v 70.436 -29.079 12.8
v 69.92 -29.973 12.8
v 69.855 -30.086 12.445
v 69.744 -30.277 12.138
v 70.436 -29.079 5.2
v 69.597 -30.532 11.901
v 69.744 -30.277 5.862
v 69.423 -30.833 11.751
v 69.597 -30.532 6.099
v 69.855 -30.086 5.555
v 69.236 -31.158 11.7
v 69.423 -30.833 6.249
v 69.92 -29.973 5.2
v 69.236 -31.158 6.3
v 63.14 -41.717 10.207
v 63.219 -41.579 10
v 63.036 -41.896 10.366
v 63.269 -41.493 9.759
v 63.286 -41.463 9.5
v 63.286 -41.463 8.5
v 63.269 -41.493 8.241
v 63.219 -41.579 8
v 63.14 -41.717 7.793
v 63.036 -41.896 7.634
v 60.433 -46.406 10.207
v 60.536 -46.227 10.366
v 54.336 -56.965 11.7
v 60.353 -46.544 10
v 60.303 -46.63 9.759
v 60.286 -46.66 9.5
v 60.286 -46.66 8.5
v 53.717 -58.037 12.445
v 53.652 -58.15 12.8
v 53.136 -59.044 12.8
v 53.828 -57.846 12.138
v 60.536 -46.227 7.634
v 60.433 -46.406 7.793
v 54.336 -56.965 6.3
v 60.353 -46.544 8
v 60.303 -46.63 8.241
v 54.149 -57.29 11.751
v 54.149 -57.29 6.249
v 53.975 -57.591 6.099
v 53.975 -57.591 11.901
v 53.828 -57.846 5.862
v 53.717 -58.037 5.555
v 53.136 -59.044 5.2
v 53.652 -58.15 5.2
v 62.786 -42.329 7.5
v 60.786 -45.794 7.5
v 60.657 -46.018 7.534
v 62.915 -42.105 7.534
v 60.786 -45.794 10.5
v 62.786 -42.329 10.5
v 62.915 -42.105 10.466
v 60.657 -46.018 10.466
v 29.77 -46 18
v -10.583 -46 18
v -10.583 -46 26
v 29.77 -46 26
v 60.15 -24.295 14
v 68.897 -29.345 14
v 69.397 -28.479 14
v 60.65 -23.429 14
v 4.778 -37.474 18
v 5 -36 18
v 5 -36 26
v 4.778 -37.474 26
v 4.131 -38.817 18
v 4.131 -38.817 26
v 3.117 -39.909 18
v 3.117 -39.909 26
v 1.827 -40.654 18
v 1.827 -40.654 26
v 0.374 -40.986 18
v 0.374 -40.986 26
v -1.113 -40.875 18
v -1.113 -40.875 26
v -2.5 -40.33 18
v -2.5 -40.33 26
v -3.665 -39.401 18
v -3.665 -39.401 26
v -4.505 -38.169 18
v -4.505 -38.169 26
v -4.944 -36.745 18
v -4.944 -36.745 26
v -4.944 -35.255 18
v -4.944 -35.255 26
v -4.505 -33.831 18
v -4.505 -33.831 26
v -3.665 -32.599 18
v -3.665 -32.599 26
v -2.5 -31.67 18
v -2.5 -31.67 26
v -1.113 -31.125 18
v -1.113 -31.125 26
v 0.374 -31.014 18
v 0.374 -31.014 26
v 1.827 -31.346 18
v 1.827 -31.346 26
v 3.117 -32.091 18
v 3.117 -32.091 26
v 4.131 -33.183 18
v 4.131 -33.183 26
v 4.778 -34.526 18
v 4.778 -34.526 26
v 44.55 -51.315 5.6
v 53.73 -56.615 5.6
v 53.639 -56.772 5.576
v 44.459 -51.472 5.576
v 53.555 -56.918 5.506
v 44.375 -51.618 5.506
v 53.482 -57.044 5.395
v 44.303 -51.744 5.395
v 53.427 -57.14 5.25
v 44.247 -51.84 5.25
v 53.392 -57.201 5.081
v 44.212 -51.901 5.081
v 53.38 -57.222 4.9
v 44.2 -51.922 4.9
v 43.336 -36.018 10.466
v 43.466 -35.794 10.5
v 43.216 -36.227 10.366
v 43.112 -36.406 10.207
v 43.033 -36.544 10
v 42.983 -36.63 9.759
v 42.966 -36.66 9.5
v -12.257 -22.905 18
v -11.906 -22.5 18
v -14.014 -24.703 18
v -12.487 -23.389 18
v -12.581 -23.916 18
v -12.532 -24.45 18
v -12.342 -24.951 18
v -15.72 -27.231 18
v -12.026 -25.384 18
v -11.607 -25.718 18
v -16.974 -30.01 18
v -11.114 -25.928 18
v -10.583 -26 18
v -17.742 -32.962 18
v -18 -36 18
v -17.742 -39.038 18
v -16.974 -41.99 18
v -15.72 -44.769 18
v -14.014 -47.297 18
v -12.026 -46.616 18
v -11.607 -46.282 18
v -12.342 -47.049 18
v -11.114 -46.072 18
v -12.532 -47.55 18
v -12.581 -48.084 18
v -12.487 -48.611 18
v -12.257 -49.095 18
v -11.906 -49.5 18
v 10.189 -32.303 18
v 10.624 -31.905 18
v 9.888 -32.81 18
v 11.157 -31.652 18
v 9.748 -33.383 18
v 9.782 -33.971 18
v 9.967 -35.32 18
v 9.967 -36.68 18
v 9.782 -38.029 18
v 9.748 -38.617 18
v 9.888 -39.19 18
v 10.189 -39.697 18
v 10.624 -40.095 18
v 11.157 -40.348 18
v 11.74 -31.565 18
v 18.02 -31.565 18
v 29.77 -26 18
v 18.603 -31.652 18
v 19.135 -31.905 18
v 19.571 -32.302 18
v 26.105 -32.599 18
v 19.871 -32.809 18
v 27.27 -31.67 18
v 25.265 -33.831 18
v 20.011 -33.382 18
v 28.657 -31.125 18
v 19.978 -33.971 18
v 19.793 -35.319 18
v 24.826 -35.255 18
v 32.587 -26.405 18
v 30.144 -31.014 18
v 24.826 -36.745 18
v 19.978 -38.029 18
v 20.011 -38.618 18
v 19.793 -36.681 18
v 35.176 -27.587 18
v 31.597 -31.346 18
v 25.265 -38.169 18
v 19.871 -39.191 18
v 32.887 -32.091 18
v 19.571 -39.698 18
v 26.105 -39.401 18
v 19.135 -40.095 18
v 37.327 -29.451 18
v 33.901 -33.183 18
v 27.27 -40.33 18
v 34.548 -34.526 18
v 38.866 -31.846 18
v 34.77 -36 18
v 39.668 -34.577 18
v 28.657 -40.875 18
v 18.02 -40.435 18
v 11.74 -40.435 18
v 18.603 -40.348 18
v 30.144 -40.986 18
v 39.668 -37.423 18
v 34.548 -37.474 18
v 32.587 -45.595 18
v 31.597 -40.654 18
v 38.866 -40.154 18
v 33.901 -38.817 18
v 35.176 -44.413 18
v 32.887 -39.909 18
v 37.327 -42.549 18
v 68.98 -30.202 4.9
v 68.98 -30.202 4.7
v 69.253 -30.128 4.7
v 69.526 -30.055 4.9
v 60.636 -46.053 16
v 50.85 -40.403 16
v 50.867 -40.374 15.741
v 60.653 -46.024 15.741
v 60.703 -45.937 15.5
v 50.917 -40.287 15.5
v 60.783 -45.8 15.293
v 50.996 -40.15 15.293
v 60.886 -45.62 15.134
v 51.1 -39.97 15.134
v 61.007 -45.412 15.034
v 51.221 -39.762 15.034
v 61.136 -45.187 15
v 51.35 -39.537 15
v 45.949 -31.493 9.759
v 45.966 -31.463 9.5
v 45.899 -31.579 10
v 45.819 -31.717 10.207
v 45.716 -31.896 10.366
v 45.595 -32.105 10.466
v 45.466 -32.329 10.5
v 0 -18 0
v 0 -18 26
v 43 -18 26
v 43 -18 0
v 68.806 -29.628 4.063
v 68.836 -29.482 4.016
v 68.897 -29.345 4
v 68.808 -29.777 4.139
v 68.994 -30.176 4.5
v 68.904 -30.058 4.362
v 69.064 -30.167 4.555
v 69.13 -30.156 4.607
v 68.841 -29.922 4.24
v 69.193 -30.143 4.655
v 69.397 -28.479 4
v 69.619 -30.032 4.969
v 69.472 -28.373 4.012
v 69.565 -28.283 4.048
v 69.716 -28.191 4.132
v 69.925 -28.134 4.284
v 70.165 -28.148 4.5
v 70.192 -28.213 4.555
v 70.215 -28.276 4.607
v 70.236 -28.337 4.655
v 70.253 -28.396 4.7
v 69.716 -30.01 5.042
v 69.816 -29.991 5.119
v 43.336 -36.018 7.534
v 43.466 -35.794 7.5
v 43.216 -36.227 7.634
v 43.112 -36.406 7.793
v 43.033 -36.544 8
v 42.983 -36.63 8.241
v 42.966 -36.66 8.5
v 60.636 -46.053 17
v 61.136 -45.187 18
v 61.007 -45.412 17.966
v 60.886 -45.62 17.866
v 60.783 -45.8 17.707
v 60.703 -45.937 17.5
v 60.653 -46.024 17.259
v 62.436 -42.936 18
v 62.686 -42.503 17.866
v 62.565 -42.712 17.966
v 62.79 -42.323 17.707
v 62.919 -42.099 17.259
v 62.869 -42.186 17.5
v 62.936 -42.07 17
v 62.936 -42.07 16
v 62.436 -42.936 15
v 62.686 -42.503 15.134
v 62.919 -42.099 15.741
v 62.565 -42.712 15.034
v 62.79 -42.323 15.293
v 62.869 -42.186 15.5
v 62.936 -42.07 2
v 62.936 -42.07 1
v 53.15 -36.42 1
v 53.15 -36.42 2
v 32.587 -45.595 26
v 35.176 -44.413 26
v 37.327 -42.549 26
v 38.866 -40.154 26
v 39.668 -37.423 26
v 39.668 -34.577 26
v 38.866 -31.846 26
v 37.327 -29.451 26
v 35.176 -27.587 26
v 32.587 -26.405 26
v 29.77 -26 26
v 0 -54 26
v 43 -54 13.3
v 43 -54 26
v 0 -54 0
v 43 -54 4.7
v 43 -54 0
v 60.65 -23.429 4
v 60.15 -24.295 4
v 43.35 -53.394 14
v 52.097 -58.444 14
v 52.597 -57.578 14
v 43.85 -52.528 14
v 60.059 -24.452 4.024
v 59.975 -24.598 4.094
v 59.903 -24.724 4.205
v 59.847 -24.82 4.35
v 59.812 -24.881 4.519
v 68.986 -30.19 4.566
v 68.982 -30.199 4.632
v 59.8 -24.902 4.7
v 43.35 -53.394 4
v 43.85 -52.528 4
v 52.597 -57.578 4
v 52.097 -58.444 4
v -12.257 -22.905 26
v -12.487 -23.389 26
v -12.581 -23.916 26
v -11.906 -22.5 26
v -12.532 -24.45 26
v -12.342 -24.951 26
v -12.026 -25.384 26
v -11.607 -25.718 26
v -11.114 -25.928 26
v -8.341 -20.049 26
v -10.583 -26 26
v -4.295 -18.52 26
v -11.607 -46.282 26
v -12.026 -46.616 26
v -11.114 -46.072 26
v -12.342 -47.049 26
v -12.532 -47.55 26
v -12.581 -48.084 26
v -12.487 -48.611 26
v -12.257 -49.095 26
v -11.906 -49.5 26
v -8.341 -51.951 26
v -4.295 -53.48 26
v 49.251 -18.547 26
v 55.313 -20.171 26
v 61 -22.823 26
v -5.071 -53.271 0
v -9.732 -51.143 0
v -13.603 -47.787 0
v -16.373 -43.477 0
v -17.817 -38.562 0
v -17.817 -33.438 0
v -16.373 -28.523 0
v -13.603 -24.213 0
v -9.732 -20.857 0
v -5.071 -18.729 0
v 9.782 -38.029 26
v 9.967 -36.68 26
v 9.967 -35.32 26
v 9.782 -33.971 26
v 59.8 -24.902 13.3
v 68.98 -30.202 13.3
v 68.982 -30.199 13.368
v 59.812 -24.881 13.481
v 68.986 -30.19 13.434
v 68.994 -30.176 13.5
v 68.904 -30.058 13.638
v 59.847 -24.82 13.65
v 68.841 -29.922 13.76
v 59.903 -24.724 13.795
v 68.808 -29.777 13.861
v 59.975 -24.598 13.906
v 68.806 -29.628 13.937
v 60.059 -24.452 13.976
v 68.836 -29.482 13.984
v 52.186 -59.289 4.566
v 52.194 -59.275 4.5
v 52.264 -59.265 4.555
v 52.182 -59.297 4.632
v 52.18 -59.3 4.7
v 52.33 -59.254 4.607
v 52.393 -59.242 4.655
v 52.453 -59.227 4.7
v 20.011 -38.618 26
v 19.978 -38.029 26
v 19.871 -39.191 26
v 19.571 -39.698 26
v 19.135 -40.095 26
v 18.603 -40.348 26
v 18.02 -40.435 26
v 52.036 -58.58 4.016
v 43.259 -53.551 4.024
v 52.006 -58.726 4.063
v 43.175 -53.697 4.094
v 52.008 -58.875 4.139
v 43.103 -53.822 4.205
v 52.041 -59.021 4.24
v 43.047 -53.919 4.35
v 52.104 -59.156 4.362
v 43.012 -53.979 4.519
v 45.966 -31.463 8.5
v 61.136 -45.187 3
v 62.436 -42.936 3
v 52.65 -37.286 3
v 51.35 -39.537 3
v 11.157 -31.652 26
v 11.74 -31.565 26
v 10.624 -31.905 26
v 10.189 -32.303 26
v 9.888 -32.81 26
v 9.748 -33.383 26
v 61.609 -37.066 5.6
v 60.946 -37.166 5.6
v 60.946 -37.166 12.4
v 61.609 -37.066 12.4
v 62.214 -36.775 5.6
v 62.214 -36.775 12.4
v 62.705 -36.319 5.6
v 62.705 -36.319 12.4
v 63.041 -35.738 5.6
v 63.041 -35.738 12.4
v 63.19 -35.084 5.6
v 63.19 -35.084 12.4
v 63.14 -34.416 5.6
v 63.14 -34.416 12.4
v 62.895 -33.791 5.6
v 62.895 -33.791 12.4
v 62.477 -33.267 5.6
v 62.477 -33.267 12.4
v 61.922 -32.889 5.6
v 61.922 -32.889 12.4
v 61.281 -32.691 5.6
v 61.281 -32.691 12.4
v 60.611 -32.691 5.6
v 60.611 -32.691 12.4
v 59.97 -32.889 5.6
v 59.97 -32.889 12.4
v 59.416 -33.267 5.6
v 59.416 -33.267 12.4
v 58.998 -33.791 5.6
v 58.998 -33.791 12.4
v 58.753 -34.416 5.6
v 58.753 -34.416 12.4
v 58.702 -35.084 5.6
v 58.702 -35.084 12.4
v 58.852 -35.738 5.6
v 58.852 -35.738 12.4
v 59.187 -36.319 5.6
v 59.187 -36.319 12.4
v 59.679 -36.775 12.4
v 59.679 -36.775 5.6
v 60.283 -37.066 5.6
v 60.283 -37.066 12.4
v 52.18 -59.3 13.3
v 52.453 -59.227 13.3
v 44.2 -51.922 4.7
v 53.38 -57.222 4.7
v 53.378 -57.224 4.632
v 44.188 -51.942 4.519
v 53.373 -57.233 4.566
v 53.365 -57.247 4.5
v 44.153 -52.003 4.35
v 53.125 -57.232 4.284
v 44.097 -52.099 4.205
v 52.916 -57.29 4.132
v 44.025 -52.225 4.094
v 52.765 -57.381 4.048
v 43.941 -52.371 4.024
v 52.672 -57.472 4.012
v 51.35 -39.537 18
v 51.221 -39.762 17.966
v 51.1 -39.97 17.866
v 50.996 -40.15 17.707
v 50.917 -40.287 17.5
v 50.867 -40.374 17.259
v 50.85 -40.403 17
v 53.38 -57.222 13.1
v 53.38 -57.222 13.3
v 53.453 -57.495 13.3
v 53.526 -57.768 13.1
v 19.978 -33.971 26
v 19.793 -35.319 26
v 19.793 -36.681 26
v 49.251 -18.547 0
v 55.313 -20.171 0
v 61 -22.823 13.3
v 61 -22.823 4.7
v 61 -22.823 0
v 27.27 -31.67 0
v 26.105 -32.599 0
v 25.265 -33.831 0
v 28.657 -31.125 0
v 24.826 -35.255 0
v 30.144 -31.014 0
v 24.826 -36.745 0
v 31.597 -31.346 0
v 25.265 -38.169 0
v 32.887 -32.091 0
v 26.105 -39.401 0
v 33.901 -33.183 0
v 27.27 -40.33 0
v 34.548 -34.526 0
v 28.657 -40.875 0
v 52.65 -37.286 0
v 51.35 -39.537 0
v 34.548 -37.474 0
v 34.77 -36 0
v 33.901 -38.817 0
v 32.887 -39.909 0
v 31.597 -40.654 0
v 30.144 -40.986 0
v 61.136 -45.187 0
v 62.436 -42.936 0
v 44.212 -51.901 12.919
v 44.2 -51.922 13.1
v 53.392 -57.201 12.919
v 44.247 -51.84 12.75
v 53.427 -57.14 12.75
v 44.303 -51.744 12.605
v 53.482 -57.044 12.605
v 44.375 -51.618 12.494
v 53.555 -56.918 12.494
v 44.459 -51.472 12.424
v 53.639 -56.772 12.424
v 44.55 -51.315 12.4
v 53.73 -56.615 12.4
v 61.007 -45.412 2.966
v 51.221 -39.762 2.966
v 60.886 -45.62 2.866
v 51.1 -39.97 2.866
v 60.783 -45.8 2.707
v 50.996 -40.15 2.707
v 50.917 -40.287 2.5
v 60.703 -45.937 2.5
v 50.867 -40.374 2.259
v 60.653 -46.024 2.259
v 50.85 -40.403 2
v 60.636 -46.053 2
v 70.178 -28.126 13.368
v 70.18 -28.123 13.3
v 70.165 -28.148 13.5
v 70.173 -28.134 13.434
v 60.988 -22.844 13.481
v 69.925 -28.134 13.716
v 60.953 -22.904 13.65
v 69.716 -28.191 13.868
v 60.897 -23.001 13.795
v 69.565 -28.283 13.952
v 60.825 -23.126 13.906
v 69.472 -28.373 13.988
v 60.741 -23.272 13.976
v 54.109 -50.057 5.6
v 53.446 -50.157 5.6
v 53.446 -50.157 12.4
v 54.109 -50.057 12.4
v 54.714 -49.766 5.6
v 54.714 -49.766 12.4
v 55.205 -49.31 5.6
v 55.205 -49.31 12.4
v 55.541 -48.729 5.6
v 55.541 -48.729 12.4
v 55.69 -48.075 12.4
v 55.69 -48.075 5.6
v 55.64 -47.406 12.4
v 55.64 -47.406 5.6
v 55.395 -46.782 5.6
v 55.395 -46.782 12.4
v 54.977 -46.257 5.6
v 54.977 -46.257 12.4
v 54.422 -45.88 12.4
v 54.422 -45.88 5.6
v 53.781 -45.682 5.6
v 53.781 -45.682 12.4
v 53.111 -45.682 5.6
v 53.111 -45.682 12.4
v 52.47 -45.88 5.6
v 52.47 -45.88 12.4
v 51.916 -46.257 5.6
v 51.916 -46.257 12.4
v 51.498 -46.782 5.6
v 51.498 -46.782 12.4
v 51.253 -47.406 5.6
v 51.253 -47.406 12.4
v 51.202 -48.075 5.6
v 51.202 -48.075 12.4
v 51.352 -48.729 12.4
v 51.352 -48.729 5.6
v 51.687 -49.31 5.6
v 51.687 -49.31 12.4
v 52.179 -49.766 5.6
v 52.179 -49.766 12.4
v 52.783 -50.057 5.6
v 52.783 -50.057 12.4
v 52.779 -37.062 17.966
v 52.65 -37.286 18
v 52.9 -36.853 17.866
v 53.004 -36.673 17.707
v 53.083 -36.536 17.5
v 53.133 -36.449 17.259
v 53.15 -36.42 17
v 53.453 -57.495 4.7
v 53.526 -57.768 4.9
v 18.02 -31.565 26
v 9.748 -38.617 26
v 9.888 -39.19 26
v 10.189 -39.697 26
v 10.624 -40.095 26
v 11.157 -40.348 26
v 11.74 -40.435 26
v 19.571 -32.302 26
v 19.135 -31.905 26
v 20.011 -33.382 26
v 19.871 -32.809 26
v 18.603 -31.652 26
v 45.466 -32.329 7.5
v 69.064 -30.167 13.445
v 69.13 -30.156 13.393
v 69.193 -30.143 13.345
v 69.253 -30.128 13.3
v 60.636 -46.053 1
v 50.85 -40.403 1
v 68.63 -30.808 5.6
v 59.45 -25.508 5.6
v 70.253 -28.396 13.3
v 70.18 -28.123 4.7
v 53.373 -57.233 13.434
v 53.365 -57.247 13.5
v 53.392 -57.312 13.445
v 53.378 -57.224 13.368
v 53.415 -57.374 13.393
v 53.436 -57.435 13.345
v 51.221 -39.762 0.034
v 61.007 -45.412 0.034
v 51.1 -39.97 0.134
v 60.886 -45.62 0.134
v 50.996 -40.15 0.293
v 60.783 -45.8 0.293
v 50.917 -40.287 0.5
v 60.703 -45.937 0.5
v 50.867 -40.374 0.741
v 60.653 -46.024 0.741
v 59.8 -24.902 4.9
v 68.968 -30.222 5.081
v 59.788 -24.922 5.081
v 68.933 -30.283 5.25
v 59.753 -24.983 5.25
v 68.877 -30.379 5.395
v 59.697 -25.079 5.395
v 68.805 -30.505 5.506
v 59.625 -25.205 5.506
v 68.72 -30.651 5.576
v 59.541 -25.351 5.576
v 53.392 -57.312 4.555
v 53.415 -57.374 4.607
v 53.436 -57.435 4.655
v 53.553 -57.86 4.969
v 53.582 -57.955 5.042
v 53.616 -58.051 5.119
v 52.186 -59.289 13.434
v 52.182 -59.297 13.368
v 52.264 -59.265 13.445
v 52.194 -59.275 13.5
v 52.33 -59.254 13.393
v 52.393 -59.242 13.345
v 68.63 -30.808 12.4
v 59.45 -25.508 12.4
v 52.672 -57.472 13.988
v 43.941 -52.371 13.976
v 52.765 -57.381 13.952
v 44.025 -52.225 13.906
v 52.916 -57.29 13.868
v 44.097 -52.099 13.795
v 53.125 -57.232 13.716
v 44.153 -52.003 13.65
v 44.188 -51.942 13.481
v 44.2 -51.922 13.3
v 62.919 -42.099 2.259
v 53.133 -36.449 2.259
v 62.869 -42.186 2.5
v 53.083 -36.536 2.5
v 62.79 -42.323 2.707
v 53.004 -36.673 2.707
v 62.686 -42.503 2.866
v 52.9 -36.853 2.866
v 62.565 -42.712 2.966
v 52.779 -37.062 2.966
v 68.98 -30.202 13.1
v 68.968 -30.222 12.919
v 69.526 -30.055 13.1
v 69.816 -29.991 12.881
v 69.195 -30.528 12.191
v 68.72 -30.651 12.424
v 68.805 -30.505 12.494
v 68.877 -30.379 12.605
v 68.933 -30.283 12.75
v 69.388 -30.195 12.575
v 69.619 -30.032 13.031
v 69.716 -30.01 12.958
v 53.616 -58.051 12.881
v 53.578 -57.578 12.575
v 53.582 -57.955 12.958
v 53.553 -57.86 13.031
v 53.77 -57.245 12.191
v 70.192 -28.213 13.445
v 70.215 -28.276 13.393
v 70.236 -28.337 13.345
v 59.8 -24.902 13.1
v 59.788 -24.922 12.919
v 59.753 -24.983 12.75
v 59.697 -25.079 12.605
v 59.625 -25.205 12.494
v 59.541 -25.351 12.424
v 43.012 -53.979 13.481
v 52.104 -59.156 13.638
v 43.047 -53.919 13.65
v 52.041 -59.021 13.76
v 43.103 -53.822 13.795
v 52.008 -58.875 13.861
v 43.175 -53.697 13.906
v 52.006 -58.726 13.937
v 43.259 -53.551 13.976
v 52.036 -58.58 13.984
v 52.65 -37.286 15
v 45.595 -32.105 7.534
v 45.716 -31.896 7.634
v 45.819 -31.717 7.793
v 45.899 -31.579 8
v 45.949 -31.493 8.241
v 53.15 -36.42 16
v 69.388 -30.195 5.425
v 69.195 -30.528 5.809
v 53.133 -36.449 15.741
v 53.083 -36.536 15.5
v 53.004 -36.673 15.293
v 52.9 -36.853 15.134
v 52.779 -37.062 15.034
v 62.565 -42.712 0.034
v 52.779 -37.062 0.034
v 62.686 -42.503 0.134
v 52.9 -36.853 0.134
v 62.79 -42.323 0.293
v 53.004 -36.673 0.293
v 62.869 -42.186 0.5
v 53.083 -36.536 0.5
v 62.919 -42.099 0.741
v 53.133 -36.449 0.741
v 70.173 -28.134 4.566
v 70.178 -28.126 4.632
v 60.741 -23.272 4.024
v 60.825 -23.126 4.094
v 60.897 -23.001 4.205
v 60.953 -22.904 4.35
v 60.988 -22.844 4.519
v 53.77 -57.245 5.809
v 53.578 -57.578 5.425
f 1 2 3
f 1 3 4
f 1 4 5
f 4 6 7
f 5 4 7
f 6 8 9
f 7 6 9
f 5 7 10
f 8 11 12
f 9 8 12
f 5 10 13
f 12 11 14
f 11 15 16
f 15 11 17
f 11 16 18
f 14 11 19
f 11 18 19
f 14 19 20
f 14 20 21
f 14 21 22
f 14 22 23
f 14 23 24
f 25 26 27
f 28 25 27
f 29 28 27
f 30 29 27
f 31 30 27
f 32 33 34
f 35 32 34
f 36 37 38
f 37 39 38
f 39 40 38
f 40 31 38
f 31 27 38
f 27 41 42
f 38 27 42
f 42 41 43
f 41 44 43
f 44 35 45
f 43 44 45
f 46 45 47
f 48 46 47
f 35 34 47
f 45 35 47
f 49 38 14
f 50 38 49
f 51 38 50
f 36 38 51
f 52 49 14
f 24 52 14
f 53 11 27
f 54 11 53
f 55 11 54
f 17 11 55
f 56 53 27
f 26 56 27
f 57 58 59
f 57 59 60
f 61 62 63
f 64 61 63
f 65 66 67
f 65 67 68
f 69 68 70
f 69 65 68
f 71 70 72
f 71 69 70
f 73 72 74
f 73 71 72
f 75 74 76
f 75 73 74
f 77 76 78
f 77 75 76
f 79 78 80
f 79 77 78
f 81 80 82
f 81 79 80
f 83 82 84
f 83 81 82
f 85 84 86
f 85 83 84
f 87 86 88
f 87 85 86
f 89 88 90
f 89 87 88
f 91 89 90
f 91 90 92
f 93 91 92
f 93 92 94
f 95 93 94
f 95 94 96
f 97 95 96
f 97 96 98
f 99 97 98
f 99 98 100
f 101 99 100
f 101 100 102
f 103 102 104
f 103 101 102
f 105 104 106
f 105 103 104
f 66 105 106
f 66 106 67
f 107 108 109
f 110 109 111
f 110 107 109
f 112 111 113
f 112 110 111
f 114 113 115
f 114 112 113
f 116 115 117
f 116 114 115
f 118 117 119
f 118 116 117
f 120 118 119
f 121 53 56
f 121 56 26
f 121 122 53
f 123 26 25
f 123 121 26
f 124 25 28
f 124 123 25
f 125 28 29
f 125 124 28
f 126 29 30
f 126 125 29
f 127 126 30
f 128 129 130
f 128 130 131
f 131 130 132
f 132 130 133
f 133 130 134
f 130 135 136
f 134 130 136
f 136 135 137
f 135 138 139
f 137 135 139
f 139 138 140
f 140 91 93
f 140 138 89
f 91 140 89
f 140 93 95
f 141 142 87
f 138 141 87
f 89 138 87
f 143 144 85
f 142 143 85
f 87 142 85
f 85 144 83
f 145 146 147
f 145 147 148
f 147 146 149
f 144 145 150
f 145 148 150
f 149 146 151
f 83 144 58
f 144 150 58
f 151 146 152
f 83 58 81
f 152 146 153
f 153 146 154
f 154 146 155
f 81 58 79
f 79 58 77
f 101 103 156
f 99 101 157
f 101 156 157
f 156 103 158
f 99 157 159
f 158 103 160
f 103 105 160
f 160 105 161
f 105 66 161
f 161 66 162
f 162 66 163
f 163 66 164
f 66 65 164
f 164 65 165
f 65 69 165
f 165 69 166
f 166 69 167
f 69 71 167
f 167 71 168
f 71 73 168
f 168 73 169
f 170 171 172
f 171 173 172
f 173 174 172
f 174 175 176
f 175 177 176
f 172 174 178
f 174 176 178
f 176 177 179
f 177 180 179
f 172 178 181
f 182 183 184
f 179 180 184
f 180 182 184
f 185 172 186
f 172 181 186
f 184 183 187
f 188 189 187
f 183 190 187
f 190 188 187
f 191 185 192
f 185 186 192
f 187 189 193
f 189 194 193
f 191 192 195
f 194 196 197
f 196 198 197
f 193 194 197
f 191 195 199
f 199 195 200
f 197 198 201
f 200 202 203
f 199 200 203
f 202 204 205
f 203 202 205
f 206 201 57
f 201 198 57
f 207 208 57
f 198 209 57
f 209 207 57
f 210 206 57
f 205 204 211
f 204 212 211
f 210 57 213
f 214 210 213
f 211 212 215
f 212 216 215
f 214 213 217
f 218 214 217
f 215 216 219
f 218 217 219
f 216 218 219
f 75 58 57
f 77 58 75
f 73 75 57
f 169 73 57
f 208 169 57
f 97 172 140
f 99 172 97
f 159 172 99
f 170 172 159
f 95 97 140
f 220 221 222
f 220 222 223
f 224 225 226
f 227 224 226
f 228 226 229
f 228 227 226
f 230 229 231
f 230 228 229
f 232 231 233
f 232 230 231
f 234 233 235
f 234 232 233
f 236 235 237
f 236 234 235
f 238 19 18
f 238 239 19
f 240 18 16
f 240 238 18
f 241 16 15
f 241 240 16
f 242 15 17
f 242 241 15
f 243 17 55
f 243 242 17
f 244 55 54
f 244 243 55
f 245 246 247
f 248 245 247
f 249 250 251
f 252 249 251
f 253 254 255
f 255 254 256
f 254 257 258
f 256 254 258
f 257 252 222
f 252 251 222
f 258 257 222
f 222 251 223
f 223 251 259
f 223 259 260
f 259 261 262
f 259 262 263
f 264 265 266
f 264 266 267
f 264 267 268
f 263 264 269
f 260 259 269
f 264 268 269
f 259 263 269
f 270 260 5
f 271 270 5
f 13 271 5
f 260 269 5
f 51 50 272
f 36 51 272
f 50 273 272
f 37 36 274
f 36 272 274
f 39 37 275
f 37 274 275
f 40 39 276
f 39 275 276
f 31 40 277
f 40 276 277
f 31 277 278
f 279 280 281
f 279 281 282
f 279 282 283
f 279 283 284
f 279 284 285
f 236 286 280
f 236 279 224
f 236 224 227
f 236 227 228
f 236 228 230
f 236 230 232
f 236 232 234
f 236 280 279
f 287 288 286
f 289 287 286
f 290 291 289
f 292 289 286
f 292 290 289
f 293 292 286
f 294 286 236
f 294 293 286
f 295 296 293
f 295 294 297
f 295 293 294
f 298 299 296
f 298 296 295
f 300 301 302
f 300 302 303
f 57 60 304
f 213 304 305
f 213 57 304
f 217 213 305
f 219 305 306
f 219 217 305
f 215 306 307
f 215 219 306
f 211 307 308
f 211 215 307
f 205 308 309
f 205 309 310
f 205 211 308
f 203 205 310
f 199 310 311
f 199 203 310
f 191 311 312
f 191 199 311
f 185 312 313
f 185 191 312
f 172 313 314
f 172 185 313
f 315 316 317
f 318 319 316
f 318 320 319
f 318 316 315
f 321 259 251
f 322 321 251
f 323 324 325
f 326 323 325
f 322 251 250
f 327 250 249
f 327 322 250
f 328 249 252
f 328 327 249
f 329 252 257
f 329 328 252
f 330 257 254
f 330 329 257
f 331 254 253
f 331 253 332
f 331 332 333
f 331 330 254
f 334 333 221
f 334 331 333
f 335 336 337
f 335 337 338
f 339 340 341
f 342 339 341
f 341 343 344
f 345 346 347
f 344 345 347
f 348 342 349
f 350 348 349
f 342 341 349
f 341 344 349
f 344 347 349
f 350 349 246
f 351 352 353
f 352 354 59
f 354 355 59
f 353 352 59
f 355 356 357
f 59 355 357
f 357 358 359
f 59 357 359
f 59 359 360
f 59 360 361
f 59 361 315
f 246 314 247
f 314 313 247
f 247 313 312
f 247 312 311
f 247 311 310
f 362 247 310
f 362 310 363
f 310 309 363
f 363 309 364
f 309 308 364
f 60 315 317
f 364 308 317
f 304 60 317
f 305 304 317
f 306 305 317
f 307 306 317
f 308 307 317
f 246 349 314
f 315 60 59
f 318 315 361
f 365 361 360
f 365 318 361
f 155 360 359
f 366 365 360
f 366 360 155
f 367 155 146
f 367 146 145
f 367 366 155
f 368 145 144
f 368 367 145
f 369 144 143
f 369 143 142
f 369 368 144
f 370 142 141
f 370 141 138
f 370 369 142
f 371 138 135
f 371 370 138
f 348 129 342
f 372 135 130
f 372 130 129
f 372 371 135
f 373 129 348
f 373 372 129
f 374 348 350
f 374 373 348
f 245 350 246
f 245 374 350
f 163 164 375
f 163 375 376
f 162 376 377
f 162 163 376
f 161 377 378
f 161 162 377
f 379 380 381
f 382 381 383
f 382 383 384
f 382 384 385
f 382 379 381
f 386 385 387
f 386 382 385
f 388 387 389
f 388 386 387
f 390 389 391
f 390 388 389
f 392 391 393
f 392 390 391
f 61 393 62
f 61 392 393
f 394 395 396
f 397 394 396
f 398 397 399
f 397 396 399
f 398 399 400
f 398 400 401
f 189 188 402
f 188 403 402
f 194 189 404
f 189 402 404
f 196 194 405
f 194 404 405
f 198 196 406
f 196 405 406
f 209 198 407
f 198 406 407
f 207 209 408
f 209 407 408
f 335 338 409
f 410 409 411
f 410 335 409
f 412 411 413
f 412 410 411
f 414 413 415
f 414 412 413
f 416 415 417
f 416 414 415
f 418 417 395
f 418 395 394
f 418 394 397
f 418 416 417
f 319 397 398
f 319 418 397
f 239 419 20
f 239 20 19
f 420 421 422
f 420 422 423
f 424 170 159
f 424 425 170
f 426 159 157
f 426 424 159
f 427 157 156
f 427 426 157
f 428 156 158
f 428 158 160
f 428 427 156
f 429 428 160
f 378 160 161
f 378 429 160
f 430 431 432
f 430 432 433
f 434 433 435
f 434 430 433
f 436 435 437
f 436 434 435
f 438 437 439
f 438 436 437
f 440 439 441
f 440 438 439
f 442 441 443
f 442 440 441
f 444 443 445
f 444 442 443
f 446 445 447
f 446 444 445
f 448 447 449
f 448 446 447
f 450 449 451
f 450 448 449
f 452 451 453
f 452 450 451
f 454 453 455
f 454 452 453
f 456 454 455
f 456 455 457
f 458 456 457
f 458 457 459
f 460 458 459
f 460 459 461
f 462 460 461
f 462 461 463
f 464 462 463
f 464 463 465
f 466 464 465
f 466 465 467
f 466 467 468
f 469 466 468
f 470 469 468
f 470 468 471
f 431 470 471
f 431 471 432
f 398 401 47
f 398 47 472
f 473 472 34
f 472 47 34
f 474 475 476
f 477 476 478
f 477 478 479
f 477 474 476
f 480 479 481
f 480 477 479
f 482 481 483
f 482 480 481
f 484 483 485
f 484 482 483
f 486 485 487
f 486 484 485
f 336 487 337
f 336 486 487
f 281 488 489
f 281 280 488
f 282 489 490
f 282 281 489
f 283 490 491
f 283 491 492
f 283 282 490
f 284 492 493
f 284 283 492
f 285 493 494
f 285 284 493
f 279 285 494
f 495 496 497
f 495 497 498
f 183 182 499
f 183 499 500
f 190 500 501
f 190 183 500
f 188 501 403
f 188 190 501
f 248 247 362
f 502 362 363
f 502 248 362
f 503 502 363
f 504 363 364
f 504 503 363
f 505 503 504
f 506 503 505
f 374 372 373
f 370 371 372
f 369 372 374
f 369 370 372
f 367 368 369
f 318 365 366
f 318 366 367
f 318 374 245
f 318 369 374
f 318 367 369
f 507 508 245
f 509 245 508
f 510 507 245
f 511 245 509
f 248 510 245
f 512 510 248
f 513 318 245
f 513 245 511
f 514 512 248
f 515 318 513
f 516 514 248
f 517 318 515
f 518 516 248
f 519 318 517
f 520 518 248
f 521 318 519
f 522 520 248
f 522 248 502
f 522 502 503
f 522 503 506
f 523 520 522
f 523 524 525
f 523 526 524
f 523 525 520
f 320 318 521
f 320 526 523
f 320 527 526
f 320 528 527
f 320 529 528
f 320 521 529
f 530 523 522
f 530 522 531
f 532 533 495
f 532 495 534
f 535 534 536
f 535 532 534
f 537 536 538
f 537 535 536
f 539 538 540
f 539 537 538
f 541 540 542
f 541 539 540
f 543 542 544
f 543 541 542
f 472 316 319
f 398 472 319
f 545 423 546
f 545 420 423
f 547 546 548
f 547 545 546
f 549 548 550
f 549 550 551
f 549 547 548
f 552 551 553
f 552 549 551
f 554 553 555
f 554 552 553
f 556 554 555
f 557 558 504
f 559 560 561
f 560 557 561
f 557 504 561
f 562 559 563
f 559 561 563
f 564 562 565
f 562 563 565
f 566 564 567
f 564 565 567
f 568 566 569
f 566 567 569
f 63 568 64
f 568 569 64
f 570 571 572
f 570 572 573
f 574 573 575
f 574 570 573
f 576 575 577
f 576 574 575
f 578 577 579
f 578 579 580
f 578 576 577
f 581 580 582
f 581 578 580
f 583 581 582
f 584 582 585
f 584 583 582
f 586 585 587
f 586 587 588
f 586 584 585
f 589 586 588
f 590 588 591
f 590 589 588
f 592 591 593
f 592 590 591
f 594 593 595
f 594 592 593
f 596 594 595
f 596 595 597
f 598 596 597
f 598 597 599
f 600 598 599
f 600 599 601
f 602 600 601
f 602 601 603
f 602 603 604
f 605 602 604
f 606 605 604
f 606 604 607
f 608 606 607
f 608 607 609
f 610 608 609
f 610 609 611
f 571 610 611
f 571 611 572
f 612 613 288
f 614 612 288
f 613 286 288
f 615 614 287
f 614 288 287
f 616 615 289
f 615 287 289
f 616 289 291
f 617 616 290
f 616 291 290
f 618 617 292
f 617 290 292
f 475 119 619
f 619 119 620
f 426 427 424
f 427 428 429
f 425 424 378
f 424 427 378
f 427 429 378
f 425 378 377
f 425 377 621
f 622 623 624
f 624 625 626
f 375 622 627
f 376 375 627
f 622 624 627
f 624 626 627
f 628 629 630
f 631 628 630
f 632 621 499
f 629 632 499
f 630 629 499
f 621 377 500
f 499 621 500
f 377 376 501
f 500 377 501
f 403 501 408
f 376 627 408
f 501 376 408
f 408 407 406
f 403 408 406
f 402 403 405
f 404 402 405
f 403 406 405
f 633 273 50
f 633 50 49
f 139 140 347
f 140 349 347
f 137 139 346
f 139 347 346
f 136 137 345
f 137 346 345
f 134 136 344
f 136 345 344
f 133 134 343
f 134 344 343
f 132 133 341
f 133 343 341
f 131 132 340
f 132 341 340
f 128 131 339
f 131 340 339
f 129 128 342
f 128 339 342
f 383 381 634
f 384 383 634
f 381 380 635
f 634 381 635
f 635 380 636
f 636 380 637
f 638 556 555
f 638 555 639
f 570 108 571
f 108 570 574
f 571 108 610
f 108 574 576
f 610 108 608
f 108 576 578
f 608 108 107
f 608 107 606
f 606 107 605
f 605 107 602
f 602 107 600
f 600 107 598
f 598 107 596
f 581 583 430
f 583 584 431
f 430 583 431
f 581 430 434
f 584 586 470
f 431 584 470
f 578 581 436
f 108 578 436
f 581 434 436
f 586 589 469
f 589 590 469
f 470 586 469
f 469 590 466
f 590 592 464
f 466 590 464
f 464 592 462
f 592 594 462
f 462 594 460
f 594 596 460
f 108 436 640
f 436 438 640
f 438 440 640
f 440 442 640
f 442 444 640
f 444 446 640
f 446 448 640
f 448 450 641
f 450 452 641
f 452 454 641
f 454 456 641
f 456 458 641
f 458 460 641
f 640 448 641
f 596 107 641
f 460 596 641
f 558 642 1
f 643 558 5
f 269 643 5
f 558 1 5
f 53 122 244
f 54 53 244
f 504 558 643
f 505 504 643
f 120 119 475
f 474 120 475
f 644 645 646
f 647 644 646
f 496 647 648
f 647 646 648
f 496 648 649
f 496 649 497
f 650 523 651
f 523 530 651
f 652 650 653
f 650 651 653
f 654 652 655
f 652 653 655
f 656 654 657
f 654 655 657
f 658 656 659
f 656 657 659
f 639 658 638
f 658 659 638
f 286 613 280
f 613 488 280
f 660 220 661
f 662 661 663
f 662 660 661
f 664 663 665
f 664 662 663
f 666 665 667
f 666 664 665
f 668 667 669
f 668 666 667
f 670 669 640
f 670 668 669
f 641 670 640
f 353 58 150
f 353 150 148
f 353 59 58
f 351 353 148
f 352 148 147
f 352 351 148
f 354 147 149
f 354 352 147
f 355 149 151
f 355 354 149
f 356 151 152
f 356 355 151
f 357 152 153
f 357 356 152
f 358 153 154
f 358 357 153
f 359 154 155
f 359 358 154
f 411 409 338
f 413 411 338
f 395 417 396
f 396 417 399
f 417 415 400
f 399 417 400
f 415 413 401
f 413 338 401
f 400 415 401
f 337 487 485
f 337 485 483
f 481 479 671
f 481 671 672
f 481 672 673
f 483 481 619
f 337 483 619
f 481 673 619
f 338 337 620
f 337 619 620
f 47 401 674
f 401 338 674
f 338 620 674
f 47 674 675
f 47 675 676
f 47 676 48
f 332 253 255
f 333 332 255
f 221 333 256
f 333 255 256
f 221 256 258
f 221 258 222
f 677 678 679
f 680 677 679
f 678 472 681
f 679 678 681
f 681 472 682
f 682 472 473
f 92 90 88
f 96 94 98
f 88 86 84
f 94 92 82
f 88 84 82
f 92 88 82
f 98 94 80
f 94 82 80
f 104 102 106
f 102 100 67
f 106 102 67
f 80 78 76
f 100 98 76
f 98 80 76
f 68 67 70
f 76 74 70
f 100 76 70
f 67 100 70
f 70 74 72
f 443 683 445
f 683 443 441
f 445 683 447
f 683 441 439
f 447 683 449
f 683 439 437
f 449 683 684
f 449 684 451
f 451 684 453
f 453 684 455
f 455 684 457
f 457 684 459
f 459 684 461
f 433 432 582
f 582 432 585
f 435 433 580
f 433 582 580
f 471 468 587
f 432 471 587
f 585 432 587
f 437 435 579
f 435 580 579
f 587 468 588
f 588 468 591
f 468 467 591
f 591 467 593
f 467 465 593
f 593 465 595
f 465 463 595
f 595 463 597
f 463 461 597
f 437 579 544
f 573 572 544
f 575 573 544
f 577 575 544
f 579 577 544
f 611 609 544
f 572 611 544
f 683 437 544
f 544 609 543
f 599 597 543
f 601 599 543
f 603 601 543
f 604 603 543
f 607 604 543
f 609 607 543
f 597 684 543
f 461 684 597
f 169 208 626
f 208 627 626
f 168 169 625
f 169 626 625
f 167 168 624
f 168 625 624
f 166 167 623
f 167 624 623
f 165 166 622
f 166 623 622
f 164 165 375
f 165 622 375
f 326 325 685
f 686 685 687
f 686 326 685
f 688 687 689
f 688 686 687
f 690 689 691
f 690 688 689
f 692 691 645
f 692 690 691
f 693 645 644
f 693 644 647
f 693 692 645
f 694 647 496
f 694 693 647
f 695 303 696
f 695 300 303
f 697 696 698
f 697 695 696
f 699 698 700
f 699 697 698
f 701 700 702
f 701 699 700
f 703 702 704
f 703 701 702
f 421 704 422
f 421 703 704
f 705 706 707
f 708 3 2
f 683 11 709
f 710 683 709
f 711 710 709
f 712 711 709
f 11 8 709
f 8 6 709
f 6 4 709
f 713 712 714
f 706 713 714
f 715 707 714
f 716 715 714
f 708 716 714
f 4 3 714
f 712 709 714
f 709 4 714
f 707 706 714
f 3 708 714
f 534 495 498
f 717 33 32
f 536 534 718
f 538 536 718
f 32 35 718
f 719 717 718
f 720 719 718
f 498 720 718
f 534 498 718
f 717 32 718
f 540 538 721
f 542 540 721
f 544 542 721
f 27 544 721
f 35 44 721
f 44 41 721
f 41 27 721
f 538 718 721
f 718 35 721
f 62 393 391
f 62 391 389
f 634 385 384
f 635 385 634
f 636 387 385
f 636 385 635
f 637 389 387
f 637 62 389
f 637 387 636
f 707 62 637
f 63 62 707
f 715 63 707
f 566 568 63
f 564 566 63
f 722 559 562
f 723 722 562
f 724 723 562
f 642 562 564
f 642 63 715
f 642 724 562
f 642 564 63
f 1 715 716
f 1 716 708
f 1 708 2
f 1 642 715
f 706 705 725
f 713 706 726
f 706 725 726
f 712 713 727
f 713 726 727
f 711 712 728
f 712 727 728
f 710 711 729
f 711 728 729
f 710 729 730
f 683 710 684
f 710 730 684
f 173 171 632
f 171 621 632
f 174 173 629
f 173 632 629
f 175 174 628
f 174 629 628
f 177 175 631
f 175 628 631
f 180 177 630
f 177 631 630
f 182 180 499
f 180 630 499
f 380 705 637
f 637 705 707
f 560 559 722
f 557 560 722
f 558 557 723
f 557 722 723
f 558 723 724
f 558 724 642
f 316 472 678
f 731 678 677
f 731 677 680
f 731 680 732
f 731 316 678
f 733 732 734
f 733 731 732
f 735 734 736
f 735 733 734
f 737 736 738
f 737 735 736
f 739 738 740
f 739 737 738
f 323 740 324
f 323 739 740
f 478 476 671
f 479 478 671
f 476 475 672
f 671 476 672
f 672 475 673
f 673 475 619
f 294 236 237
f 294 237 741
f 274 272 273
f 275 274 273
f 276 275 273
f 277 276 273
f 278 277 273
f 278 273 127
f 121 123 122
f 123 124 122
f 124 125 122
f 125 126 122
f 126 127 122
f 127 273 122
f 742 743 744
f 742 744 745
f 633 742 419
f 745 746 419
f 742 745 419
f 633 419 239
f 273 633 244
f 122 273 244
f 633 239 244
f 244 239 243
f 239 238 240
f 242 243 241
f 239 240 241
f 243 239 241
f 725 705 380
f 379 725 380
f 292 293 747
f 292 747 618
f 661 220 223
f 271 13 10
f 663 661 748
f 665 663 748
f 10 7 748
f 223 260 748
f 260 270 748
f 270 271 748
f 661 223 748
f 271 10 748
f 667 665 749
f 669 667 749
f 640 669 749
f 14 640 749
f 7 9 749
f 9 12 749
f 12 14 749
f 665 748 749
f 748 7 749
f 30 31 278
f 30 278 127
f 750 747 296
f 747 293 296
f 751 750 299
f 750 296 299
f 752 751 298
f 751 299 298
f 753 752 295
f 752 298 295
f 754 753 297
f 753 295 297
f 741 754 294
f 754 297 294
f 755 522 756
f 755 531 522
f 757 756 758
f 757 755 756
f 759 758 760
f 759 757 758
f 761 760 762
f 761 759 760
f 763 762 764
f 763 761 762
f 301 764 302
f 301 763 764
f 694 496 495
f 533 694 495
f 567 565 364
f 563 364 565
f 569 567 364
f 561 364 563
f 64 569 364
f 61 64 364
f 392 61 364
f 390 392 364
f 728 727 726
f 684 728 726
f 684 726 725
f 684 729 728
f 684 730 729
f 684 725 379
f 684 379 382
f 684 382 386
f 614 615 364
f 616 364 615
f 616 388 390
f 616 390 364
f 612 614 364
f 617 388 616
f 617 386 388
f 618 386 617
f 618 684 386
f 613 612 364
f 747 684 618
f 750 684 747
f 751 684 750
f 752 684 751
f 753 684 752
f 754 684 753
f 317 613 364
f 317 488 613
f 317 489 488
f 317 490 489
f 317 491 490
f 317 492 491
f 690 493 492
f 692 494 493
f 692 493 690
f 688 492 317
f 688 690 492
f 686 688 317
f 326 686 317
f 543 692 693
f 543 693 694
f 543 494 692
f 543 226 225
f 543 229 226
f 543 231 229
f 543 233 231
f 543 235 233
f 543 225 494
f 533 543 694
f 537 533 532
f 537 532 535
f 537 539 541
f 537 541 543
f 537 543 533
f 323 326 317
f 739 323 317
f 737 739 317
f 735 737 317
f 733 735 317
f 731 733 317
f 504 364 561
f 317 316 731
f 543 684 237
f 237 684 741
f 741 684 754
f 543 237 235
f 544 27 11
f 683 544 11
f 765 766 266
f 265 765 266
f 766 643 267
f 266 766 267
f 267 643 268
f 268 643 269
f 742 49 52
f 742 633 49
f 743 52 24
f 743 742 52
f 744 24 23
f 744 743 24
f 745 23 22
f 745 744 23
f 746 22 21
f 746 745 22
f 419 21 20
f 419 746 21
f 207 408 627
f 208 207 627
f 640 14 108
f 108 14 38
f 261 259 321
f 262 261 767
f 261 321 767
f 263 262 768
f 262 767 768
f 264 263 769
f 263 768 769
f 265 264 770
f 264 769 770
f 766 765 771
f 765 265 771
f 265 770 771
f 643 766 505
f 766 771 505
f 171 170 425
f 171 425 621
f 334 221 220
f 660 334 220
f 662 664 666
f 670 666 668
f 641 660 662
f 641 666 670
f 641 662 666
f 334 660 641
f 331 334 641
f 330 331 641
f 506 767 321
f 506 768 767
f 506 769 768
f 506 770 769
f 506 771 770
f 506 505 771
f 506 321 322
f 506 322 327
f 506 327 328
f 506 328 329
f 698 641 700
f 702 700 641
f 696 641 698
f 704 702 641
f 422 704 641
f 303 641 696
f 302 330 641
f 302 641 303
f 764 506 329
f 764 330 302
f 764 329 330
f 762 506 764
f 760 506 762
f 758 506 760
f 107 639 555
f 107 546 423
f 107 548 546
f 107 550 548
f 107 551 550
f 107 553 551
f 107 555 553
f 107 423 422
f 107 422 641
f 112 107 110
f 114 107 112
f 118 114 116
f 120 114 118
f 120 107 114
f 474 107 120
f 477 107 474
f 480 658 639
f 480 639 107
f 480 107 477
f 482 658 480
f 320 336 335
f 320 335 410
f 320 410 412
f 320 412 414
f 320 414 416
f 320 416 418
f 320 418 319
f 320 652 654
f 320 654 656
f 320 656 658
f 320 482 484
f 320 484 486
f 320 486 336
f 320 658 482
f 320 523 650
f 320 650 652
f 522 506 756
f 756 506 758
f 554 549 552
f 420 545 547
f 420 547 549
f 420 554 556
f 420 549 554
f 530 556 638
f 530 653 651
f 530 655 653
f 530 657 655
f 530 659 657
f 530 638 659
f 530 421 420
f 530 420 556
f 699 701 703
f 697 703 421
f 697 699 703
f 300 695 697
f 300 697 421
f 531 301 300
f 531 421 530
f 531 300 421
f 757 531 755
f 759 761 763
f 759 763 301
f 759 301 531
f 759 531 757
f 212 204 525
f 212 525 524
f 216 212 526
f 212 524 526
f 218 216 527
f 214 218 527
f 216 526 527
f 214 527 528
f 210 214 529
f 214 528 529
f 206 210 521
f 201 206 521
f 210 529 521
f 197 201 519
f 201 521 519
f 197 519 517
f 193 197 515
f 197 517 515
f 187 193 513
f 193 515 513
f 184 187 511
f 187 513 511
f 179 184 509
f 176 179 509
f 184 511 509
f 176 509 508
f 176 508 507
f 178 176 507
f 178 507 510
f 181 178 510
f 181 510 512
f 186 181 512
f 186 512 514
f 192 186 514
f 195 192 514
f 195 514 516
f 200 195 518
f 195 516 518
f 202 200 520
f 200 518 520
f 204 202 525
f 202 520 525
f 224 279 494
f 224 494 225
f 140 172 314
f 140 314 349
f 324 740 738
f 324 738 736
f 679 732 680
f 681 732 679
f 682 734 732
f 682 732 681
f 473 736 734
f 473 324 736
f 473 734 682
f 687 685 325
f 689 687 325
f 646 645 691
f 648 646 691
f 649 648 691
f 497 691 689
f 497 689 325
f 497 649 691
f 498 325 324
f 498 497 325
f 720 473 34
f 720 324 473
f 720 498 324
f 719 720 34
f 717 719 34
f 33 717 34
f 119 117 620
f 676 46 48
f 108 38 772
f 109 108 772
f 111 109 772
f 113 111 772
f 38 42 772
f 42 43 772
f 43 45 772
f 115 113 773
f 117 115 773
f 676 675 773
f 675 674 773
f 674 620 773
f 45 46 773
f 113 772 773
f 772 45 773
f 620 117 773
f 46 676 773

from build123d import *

# Parameters (mm, degrees)
SKETCH_1_R          = 4.9999999999999964
EXTRUDE_1_DEPTH     = 18
SKETCH_2_R          = 5
EXTRUDE_2_DEPTH     = 8
FILLET_2_R          = 2
EXTRUDE_4_DEPTH     = 11.3
SKETCH_8_W          = 3.000000000000001
SKETCH_8_H          = 6.0000000000000036
CUT_EXTRUDE_3_DEPTH = 20
SKETCH_9_R          = 2.250000000000002
CUT_EXTRUDE_4_DEPTH = 78.37023084919184
FILLET_1_R          = 1
EXTRUDE_5_DEPTH     = 8
FILLET_3_R          = 2
EXTRUDE_6_DEPTH     = 11.3
FILLET_4_R          = 0.7
CHAMFER_2_SIZE      = 0.7
CUT_EXTRUDE_5_REACH = 123.985
CUT_EXTRUDE_6_DEPTH = 96.67513972142032


# Read off the part's stored shape, not the designer's step: 镜向1
with BuildPart() as part:
    # 草图1 → 凸台-拉伸1 (new body)
    with BuildSketch(Plane.XY):
        with BuildLine():
            Line((61.00000000000003, -13.176914536239765), (43, 17.999999999999996))
            Line((43, 17.999999999999996), (0, 18))
            ThreePointArc((0, 18), (-18, 2.2e-15), (0, -18))
            Line((0, -18), (43, -17.999999999999996))
            ThreePointArc((43, -17.999999999999996), (52.31748562369077, -16.77332974640645), (61.00000000000003, -13.176914536239765))
        make_face()
        with Locations((29.77, 0)):
            Circle(SKETCH_1_R, mode=Mode.SUBTRACT)
    extrude(amount=EXTRUDE_1_DEPTH)

    # 草图2 → 凸台-拉伸2 (add)
    with BuildSketch(Plane.XY.offset(18)):
        with BuildLine():
            Line((8.951308150188659, -4.435), (20.807256279464415, -4.435))
            ThreePointArc((20.807256279464415, -4.434999999999999), (19.769999999999996, 4.4e-16), (20.807256279464415, 4.435))
            Line((20.807256279464415, 4.435), (8.951308150188659, 4.435))
            ThreePointArc((8.951308150188659, 4.434999999999999), (9.989751878782268, -6.7e-16), (8.951308150188659, -4.435))
        make_face()
        Circle(SKETCH_2_R)
    extrude(amount=EXTRUDE_2_DEPTH)

    # 圆角2
    fillet_2_edges = [part.edges().sort_by_distance(p)[0] for p in [
        (20.807256279464415, -4.434999999999999, 22),
        (20.807256279464415, 4.434999999999999, 22),
        (8.951308150188659, 4.434999999999999, 22),
        (8.951308150188659, -4.434999999999999, 22),
    ]]
    fillet(fillet_2_edges, radius=FILLET_2_R)

    # 草图7 → 凸台-拉伸4 (add)
    with BuildSketch(Plane(origin=(33.99999999999993, 33.588457268120045, 0), x_dir=(0, 0, -1), z_dir=(-0.866025403784438, -0.5000000000000009, 0))):
        Polygon((-5.599999999999984, 54.00000000000014), (-12.400000000000015, 54.00000000000014), (-12.400000000000004, 18.00000000000018), (-5.599999999999972, 18.00000000000019), align=None)
        Polygon((-2.9999999999999973, 33.70000000000016), (-1.041e-14, 33.70000000000016), (-1.041e-14, 38.30000000000017), (-2.9999999999999956, 38.30000000000017), align=None)
        Polygon((-15.000000000000004, 38.30000000000017), (-17.99999999999999, 38.30000000000017), (-17.99999999999999, 33.70000000000016), (-15.000000000000002, 33.70000000000016), align=None)
    extrude(amount=-EXTRUDE_4_DEPTH)

    # 草图8 → 切除-拉伸3 (cut)
    with BuildSketch(Plane(origin=(49.8303156968241, 28.769546181365495, -2.936e-14), x_dir=(-5.4e-16, -3.2e-16, 1), z_dir=(0.866025403784438, 0.500000000000001, 0))):
        with Locations((8.99999999999995, 23.911542731880154)):
            Rectangle(SKETCH_8_W, SKETCH_8_H)
    extrude(amount=-CUT_EXTRUDE_3_DEPTH, mode=Mode.SUBTRACT)

    # 草图9 → 切除-拉伸4 (cut, through all)
    with BuildSketch(Plane(origin=(-8.8e-16, 1.52e-15, 5.59999999999997), x_dir=(-1, 0, -1e-16), z_dir=(1e-16, -1.7e-16, -1))):
        with Locations(Location((-60.946152422706646, -1.0836477965031495, 0), (0, 0, 90))):
            Circle(SKETCH_9_R)
        with Locations(Location((-53.44615242270663, 11.90673326026341, 0), (0, 0, 90))):
            Circle(SKETCH_9_R)
    extrude(amount=-CUT_EXTRUDE_4_DEPTH, mode=Mode.SUBTRACT)

    # 圆角1
    fillet_1_edges = [part.edges().sort_by_distance(p)[0] for p in [
        (54.62583302491982, 0.4634665205268087, 10.499999999999913),
        (51.625833024919814, 5.659618943233441, 10.499999999999913),
        (51.625833024919814, 5.659618943233441, 7.499999999999914),
        (54.62583302491982, 0.4634665205268087, 7.499999999999914),
        (55.74304353138211, 7.2284011605843475, 17.99999999999999),
        (58.043043531382125, 3.244684303175926, 17.99999999999999),
        (58.043043531382125, 3.244684303175926, 15.000000000000004),
        (55.74304353138211, 7.2284011605843475, 15.000000000000002),
        (55.74304353138211, 7.2284011605843475, 2.9999999999999973),
        (58.043043531382125, 3.244684303175926, 2.9999999999999956),
        (58.043043531382125, 3.244684303175926, 1.041e-14),
        (55.74304353138211, 7.2284011605843475, 1.041e-14),
    ]]
    fillet(fillet_1_edges, radius=FILLET_1_R)

    # 草图10 → 凸台-拉伸5 (add)
    with BuildSketch(Plane.XY.offset(18)):
        with BuildLine():
            Line((29.77, -10), (-14.966629547095765, -10))
            ThreePointArc((-14.966629547095765, -10), (-8.48528137423857, -15.874507866387544), (0, -18.000000000000004))
            Line((0, -18.000000000000004), (43, -17.999999999999996))
            ThreePointArc((43, -17.999999999999996), (52.31748562369077, -16.77332974640645), (61.00000000000003, -13.176914536239769))
            Line((61.00000000000003, -13.176914536239769), (43, 17.999999999999996))
            Line((43, 17.999999999999996), (0, 18.000000000000004))
            ThreePointArc((0, 18.000000000000004), (-8.485281374238571, 15.874507866387546), (-14.966629547095765, 10))
            Line((-14.966629547095765, 10), (29.77, 10))
            ThreePointArc((29.77, 10), (39.769999999999996, 0), (29.77, -10))
        make_face()
    extrude(amount=EXTRUDE_5_DEPTH)

    # 圆角3
    fillet_3_edges = [part.edges().sort_by_distance(p)[0] for p in [
        (-14.966629547095767, 10, 22),
        (-14.966629547095767, -10.000000000000002, 22),
    ]]
    fillet(fillet_3_edges, radius=FILLET_3_R)

    # 草图11 → 凸台-拉伸6 (add)
    with BuildSketch(Plane(origin=(49.8303156968241, 28.769546181365495, -2.936e-14), x_dir=(5.8e-16, 2.6e-16, -1), z_dir=(0.866025403784438, 0.500000000000001, 0))):
        Polygon((-12.400000000000041, -39.51154273188015), (-13.999999999999961, -39.51154273188015), (-13.999999999999966, -41.91154273188013), (-12.400000000000041, -41.91154273188013), align=None)
        Polygon((-3.999999999999961, -39.51154273188015), (-5.6000000000000085, -39.51154273188015), (-5.60000000000001, -41.91154273188014), (-3.99999999999997, -41.91154273188013), align=None)
        Polygon((-5.600000000000001, -5.911542731880182), (-5.600000000000002, -8.31154273188016), (-3.999999999999961, -8.31154273188016), (-3.999999999999969, -5.911542731880172), align=None)
        Polygon((-13.999999999999966, -5.911542731880174), (-13.999999999999966, -8.31154273188016), (-12.400000000000034, -8.31154273188016), (-12.400000000000034, -5.911542731880178), align=None)
    extrude(amount=-EXTRUDE_6_DEPTH)

    # 圆角4
    fillet_4_edges = [part.edges().sort_by_distance(p)[0] for p in [
        (64.69304353138213, -8.273453567157098, 13.999999999999932),
        (64.69304353138213, -8.273453567157091, 12.40000000000001),
        (65.89304353138213, -10.35191453623974, 13.999999999999936),
        (64.69304353138213, -8.273453567157091, 5.599999999999978),
        (64.69304353138213, -8.273453567157091, 3.9999999999999343),
        (65.89304353138213, -10.351914536239732, 3.999999999999939),
        (47.89304353138211, 20.825000000000003, 3.999999999999937),
        (49.09304353138211, 18.74653903091736, 3.999999999999932),
        (49.09304353138211, 18.74653903091736, 5.5999999999999694),
        (49.09304353138211, 18.746539030917358, 13.99999999999993),
        (49.09304353138211, 18.746539030917358, 12.4),
        (47.89304353138211, 20.825, 13.999999999999932),
    ]]
    fillet(fillet_4_edges, radius=FILLET_4_R)

    # 倒角2
    chamfer_2_edges = [part.edges().sort_by_distance(p)[0] for p in [
        (53.986087062764184, 21.571539030917368, 4.799999999999956),
        (61.7860870627642, 8.061542731880138, 12.40000000000001),
        (69.58608706276421, -5.448453567157085, 13.199999999999976),
        (70.1860870627642, -6.4876840516984196, 13.999999999999938),
        (70.78608706276421, -7.52691453623973, 8.99999999999994),
        (70.1860870627642, -6.487684051698405, 3.999999999999942),
        (69.58608706276421, -5.448453567157085, 4.799999999999963),
        (61.786087062764196, 8.061542731880149, 5.599999999999977),
        (53.38608706276419, 22.61076951545869, 3.99999999999994),
        (52.78608706276419, 23.650000000000006, 8.99999999999994),
        (53.38608706276418, 22.610769515458685, 13.999999999999936),
        (53.986087062764184, 21.571539030917364, 13.199999999999969),
        (70.6835744361795, -7.349357458577688, 4.205025253169361),
        (70.6835744361795, -7.349357458577694, 13.794974746830517),
        (52.88859968934889, 23.47244292233795, 13.79497474683052),
        (52.888599689348894, 23.472442922337958, 4.205025253169356),
        (69.6885996893489, -5.626010644819133, 4.20502525316936),
        (69.6885996893489, -5.62601064481914, 13.79497474683052),
        (53.883574436179465, 21.749096108579412, 13.794974746830519),
        (53.88357443617947, 21.74909610857942, 4.205025253169357),
        (54.0885996893489, 21.393981953255317, 5.394974746830557),
        (54.08859968934889, 21.393981953255313, 12.60502525316942),
        (69.4835744361795, -5.27089648949504, 12.60502525316943),
        (69.48357443617951, -5.270896489495035, 5.394974746830568),
    ]]
    chamfer(chamfer_2_edges, length=CHAMFER_2_SIZE)

    # 切除-拉伸5: up to this face of the body (flat: up to its plane)
    cut_extrude_5_end = Plane(part.part.faces().sort_by_distance((47.58993464, 20.65, 9))[0])
    # 草图12 → 切除-拉伸5 (cut, up to the picked face)
    with BuildSketch(Plane(origin=(98.23909236273093, 8.323085463760323, 0), x_dir=(-0.866025403784438, -0.500000000000001, 0), z_dir=(-0.500000000000001, 0.866025403784438, 0)), mode=Mode.PRIVATE) as cut_extrude_5_sk1:
        Polygon((31.700000000000067, 12.799999999999999), (31.700000000000067, 13.999999999999998), (32.90000000000007, 13.999999999999996), align=None)
    cut_extrude_5_tool1 = split(extrude(cut_extrude_5_sk1.sketch, amount=CUT_EXTRUDE_5_REACH, mode=Mode.PRIVATE), bisect_by=cut_extrude_5_end, keep=Keep.BOTH, mode=Mode.PRIVATE)
    # 草图12 → 切除-拉伸5 (cut, up to the picked face)
    with BuildSketch(Plane(origin=(98.23909236273093, 8.323085463760323, 0), x_dir=(-0.866025403784438, -0.500000000000001, 0), z_dir=(-0.500000000000001, 0.866025403784438, 0)), mode=Mode.PRIVATE) as cut_extrude_5_sk2:
        Polygon((31.700000000000067, 4.0000000000000036), (32.90000000000007, 4.000000000000005), (31.700000000000067, 5.200000000000003), align=None)
    cut_extrude_5_tool2 = split(extrude(cut_extrude_5_sk2.sketch, amount=CUT_EXTRUDE_5_REACH, mode=Mode.PRIVATE), bisect_by=cut_extrude_5_end, keep=Keep.BOTH, mode=Mode.PRIVATE)
    add(cut_extrude_5_tool1.solids().sort_by(Axis((70.439677, -7.726915, 13.6), (-0.500000000000001, 0.866025403784438, 0)))[0], mode=Mode.SUBTRACT)
    add(cut_extrude_5_tool2.solids().sort_by(Axis((70.439677, -7.726915, 4.4), (-0.500000000000001, 0.866025403784438, 0)))[0], mode=Mode.SUBTRACT)

    # 镜向1: part across plane


with BuildPart() as part_1:
    add(part.part)
    add(part.part.mirror(Plane(origin=(0, -18, 18), x_dir=(0, 0, 1), z_dir=(-8e-17, 1, 0))))

    # 草图13 → 切除-拉伸6 (cut, through all)
    with BuildSketch(Plane.XY.offset(26)):
        Polygon((-3.31e-15, -17.999999999999996), (43, -17.999999999999996), (87.8218201095251, -17.999999999999996), (87.8218201095251, 39.78196622179553), (-28.896212069890126, 39.78196622179553), (-28.896212069890126, -17.999999999999996), align=None)
    extrude(amount=-CUT_EXTRUDE_6_DEPTH, mode=Mode.SUBTRACT)


solid = part_1.part
